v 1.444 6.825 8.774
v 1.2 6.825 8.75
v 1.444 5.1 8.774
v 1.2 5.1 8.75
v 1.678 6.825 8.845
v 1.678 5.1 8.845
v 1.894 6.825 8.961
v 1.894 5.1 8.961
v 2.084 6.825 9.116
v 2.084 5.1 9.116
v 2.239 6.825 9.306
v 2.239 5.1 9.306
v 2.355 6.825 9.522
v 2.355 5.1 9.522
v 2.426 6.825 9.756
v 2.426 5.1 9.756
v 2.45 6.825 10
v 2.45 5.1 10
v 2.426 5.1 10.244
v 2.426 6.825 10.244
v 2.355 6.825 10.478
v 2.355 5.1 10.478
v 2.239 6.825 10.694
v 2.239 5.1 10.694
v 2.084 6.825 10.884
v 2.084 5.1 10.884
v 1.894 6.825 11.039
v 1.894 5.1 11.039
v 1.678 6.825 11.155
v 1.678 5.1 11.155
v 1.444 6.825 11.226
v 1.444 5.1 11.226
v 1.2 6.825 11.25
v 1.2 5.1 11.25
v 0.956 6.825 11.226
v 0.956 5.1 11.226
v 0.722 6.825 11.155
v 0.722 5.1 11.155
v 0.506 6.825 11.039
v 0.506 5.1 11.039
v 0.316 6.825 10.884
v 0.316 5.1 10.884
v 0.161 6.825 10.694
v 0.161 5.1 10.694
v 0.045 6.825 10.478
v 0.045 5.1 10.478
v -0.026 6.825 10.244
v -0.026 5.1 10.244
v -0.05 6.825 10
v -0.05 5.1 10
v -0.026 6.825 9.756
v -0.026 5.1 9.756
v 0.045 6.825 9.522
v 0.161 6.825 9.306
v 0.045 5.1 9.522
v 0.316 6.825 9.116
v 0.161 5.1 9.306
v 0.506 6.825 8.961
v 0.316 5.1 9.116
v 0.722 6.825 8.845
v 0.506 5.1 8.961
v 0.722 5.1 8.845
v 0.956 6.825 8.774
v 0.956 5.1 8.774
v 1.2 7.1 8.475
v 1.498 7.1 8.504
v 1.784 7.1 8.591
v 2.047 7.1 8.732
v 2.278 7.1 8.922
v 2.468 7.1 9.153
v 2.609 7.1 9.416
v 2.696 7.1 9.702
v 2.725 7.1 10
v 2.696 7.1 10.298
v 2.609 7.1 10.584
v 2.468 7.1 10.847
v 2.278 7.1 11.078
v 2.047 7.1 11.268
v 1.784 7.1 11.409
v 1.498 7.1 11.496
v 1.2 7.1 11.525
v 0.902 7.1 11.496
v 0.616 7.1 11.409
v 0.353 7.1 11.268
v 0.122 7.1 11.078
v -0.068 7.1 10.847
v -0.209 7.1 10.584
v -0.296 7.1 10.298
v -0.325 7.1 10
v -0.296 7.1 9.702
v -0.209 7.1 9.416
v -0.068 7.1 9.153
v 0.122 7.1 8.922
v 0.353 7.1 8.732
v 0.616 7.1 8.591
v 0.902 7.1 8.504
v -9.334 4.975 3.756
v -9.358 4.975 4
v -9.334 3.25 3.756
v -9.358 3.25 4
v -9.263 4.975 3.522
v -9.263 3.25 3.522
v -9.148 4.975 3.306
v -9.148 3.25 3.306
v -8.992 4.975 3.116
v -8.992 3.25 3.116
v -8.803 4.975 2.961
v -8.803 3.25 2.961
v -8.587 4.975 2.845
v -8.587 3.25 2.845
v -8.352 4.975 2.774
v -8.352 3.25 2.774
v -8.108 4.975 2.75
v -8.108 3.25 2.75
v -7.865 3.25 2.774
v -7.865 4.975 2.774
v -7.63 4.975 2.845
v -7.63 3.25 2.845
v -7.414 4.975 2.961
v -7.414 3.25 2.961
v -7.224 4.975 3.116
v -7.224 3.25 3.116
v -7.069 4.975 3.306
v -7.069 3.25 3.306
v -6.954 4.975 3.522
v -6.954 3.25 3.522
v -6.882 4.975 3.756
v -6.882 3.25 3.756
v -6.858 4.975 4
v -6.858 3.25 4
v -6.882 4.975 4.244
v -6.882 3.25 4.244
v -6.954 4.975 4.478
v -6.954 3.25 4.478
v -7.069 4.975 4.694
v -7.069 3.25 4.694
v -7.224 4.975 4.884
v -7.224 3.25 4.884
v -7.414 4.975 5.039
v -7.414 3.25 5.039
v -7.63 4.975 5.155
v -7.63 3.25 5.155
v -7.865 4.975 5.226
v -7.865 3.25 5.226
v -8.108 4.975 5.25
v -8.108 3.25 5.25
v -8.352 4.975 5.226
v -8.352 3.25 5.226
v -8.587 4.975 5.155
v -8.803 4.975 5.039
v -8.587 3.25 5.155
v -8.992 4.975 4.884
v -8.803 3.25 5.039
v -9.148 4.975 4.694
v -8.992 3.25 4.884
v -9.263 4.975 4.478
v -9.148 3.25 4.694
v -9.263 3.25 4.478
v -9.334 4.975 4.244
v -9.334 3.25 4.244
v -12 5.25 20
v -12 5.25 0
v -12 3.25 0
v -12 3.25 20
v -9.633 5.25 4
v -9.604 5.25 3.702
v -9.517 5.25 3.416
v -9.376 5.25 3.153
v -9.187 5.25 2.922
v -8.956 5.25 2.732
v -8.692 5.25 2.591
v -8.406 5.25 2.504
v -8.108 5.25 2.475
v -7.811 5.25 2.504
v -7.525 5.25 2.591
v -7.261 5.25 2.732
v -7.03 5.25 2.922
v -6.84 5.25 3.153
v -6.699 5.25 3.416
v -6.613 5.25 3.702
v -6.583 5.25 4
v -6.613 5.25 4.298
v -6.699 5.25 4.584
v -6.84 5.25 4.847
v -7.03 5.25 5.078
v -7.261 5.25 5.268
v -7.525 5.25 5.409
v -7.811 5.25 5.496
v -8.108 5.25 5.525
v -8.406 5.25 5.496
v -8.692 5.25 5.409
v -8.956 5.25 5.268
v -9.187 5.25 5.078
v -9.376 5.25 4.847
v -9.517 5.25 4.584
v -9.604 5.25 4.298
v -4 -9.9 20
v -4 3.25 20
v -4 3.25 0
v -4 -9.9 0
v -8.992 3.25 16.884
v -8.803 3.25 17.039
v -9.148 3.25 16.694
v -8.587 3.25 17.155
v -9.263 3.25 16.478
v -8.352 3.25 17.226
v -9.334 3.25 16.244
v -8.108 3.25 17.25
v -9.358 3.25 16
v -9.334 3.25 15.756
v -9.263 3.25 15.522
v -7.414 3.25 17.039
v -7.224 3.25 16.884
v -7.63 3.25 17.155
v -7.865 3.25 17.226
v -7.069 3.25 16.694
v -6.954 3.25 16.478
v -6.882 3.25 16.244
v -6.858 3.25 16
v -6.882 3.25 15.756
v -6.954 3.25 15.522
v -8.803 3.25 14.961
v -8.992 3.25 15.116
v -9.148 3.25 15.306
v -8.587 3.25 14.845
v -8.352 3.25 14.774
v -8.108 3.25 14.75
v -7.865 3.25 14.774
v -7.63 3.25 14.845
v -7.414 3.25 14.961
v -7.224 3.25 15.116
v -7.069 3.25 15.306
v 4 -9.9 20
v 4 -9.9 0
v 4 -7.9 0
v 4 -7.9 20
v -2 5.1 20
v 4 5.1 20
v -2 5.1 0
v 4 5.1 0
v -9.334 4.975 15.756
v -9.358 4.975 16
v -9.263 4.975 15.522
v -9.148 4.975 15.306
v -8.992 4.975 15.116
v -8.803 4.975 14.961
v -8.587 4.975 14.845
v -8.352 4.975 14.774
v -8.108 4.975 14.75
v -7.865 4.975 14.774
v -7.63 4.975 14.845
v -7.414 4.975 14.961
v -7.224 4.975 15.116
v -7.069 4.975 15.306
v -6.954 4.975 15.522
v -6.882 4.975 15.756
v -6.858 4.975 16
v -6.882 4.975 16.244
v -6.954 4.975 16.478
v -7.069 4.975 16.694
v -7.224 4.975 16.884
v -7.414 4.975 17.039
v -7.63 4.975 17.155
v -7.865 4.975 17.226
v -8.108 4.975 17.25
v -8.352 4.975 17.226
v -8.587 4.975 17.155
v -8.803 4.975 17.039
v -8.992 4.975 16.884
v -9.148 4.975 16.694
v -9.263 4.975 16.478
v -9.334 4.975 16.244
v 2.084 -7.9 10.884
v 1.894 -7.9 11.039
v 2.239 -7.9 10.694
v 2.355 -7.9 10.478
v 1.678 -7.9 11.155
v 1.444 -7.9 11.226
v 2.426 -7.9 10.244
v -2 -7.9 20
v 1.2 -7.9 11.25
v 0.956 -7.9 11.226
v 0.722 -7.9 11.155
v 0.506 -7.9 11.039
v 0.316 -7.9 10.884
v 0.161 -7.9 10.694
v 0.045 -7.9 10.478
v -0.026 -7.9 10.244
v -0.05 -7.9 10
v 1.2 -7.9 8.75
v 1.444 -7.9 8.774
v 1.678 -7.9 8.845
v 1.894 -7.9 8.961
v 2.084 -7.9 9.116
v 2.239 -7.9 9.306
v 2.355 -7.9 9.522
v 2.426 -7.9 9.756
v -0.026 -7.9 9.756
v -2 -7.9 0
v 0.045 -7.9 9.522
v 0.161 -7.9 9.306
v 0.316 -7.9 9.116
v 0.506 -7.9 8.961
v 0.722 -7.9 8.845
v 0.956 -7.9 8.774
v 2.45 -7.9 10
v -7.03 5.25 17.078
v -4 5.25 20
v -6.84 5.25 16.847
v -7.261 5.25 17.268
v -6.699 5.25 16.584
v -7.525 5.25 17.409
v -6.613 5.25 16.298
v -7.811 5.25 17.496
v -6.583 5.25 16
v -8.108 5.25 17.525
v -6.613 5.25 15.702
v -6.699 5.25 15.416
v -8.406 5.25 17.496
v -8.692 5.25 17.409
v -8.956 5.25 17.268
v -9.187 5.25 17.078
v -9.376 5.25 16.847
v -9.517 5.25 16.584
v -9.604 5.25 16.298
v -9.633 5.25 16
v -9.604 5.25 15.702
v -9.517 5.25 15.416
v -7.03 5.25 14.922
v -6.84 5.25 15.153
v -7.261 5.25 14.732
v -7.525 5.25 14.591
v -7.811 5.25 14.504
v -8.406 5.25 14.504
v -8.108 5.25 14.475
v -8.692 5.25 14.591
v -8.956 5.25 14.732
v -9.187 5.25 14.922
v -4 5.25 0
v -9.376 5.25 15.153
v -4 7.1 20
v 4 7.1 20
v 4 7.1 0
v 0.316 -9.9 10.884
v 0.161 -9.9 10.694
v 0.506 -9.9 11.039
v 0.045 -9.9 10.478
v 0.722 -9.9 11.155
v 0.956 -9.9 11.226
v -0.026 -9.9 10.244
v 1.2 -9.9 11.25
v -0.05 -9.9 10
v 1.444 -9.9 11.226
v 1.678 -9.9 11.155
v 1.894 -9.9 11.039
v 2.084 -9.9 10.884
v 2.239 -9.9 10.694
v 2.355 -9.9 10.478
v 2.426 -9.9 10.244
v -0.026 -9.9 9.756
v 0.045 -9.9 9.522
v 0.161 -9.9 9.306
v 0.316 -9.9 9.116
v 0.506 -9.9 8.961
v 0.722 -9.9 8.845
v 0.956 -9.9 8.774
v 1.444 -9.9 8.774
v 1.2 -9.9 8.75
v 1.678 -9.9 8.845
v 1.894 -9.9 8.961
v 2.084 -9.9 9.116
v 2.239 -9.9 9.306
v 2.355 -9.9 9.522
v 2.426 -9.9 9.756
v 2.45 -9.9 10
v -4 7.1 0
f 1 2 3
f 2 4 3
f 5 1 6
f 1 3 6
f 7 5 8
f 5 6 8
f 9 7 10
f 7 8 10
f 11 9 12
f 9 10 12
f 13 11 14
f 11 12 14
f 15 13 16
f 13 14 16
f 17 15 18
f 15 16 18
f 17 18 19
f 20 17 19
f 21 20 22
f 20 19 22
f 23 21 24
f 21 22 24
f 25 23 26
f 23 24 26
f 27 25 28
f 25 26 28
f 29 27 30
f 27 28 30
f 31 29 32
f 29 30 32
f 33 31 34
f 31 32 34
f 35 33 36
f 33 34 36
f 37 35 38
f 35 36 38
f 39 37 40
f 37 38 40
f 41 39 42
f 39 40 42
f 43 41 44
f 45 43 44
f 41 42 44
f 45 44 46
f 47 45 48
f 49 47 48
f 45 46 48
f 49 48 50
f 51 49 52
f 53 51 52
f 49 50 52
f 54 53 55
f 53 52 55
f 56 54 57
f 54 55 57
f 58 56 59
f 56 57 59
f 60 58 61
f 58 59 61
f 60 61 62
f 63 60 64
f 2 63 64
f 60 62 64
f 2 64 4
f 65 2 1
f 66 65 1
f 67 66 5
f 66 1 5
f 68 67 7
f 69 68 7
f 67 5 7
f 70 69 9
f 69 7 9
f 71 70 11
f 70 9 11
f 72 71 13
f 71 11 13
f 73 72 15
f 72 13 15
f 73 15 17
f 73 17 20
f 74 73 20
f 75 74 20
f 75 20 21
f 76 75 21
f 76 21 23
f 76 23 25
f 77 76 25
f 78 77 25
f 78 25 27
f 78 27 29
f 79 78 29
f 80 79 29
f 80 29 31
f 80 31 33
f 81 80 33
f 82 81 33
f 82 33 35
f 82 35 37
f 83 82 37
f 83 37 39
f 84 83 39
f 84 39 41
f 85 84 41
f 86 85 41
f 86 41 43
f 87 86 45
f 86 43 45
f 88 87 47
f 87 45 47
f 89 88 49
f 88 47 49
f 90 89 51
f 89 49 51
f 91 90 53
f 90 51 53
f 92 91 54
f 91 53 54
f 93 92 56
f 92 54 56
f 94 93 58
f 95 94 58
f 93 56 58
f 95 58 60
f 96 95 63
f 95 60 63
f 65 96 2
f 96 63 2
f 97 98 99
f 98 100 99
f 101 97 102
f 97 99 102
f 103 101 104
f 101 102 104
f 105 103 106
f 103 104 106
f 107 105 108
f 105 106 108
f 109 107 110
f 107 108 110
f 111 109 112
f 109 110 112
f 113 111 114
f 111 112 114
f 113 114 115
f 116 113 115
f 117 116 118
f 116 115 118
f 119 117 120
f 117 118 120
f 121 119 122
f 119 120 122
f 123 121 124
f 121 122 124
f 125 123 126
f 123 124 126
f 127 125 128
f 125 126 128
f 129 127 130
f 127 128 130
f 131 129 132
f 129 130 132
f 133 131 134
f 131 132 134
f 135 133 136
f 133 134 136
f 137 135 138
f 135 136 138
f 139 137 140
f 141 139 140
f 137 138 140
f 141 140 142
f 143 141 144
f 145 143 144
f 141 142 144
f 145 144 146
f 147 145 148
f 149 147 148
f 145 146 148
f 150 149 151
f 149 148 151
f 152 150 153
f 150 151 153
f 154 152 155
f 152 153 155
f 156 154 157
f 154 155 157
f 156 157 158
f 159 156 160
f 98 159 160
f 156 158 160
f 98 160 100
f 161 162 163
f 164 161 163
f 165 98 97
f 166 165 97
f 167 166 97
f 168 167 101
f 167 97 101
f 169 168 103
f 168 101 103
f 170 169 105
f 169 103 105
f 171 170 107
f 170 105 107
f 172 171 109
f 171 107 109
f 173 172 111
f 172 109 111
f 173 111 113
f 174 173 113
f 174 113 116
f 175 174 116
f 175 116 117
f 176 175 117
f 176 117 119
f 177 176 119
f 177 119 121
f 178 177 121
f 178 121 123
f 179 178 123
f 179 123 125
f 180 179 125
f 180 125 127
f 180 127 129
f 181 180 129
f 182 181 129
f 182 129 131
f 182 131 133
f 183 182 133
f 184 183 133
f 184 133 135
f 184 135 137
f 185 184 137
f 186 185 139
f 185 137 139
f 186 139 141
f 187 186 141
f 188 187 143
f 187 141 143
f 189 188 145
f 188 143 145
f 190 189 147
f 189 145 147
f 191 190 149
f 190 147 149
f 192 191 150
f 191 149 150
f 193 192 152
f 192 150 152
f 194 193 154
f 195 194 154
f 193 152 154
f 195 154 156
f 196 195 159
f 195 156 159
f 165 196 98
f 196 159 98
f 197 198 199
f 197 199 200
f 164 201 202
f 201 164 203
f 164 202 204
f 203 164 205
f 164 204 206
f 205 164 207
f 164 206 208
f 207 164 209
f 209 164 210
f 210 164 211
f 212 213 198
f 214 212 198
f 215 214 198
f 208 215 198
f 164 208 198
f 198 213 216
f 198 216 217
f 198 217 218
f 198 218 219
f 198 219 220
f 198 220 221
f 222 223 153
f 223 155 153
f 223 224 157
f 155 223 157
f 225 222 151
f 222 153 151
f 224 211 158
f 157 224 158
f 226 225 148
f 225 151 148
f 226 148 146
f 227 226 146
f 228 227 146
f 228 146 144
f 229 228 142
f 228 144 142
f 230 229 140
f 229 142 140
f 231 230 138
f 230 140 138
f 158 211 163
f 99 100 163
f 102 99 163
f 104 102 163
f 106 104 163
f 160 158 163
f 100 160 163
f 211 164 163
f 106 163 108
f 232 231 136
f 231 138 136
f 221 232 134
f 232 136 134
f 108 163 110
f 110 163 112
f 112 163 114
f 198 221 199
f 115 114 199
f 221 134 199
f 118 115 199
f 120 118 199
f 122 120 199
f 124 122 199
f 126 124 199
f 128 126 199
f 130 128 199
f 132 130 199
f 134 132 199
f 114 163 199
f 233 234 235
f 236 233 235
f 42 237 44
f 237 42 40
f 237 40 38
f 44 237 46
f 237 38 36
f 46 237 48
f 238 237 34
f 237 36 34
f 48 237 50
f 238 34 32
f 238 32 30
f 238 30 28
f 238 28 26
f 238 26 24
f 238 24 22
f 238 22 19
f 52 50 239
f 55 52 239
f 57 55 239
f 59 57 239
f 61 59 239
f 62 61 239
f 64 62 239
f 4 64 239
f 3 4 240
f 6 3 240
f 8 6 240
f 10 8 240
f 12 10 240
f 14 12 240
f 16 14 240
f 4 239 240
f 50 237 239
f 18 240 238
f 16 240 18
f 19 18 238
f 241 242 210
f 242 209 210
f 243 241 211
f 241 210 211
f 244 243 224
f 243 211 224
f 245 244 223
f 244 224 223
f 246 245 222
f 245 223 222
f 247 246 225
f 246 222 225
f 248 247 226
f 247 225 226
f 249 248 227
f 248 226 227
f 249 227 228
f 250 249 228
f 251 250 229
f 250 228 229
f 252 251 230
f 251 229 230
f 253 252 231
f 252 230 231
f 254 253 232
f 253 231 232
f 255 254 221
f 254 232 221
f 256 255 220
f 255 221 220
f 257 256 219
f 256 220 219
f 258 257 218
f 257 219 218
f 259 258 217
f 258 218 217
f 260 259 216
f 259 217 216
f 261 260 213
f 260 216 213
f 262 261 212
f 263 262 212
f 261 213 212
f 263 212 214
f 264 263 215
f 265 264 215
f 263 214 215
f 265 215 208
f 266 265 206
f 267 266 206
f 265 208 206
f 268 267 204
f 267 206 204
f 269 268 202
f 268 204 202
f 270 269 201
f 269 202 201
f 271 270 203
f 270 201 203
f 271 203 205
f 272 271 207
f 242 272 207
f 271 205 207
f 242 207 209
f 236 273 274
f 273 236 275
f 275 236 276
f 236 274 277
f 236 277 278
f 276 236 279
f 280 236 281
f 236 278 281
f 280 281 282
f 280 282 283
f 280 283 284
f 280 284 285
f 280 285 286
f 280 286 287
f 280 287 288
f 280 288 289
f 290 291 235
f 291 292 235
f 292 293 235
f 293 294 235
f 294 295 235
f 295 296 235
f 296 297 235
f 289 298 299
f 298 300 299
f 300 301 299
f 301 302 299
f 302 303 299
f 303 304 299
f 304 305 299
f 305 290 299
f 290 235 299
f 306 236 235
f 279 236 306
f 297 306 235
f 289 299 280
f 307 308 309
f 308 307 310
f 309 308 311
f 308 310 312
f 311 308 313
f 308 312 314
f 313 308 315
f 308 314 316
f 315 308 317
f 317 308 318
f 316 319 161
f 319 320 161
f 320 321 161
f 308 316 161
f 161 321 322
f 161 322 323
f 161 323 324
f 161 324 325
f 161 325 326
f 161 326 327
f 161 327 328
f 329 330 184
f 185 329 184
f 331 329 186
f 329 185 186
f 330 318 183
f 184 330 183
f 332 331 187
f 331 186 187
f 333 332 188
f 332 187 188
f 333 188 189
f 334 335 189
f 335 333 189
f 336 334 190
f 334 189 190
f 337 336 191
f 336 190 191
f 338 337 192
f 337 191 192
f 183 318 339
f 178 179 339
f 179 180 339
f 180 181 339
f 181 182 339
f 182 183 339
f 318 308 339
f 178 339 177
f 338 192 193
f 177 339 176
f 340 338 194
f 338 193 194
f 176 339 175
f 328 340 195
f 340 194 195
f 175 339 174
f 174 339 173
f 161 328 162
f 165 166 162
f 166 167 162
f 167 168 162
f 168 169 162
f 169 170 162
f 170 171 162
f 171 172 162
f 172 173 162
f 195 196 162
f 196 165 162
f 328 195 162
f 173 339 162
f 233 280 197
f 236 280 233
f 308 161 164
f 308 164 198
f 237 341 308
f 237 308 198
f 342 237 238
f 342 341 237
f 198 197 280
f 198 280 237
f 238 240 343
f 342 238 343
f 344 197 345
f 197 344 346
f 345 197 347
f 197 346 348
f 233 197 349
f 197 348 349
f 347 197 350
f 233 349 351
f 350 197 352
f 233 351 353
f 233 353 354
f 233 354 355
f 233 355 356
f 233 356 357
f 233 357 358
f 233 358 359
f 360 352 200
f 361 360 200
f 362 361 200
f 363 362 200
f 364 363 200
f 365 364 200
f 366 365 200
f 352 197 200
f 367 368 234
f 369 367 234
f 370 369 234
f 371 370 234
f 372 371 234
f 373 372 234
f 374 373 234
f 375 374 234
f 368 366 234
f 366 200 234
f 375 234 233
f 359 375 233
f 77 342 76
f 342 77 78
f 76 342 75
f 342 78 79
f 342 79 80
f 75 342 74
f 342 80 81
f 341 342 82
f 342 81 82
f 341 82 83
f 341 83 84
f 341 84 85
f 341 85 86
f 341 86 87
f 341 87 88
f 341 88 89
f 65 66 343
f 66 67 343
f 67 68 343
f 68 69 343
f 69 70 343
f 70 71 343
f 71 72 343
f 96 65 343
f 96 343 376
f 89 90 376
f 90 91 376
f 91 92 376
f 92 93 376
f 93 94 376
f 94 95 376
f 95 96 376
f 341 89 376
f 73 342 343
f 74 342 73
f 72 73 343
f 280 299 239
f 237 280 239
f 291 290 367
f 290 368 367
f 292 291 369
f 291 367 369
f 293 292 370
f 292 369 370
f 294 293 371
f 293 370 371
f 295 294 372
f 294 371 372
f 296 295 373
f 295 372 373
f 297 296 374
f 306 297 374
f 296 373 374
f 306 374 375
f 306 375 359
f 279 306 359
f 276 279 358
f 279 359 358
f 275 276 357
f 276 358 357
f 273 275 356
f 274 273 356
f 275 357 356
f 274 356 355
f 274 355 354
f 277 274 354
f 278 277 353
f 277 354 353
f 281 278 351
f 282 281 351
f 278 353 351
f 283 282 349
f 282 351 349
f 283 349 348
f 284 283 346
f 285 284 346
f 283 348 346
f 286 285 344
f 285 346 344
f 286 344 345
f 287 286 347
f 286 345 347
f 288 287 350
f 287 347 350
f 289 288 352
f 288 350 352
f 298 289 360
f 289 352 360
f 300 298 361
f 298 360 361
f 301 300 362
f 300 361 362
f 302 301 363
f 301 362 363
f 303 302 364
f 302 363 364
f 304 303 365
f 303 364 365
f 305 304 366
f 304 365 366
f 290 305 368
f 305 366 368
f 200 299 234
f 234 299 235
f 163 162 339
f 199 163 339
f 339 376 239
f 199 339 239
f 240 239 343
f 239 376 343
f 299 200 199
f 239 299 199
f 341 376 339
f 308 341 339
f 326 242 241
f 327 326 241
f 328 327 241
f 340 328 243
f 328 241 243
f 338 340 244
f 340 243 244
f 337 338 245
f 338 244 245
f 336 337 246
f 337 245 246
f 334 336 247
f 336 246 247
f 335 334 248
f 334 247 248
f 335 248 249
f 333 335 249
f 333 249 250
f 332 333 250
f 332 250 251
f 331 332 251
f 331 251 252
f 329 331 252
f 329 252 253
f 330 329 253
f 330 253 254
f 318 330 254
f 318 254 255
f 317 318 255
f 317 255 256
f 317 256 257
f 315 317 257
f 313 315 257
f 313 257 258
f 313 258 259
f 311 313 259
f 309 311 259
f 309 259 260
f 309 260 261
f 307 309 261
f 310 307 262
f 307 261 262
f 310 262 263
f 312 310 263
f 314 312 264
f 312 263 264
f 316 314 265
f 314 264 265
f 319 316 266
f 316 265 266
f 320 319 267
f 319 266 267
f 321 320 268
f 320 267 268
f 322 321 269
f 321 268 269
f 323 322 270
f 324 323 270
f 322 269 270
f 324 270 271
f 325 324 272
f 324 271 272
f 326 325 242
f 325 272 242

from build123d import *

# Parameters (mm, degrees)
BOSS_EXTRUDE1_DEPTH         = 20
M3_TAPPED_HOLE1_D           = 2.5
M3_TAPPED_HOLE1_CSINK_D     = 3.05
M3_TAPPED_HOLE1_CSINK_ANGLE = 90
M3_TAPPED_HOLE2_D           = 2.5
M3_TAPPED_HOLE2_CSINK_D     = 3.05
M3_TAPPED_HOLE2_CSINK_ANGLE = 90


with BuildPart() as part:
    # Sketch1 → Boss-Extrude1 (new body)
    with BuildSketch(Plane.XY):
        Polygon((2, 5.1), (4, 5.1), (4, 7.1), (-4, 7.1), (-4, 5.25), (-12, 5.25), (-12, 3.25), (-4, 3.25), (-4, -9.9), (4, -9.9), (4, -7.9), (2, -7.9), (-2, -7.9), (-2, 5.1), align=None)
    extrude(amount=BOSS_EXTRUDE1_DEPTH)

    # M3 Tapped Hole1 (through all)
    with Locations(Plane(origin=(-8.108371913, 5.25, 4), x_dir=(1, 0, 0), z_dir=(0, 1, 0))):
        with Locations((0, 0), (0, -12)):
            CounterSinkHole(M3_TAPPED_HOLE1_D / 2, M3_TAPPED_HOLE1_CSINK_D / 2, counter_sink_angle=M3_TAPPED_HOLE1_CSINK_ANGLE)

    # M3 Tapped Hole2 (through all)
    with Locations(Plane(origin=(1.2, 7.1, 10), x_dir=(0, 0, 1), z_dir=(0, 1, 0))):
        with Locations((0, 0)):
            CounterSinkHole(M3_TAPPED_HOLE2_D / 2, M3_TAPPED_HOLE2_CSINK_D / 2, counter_sink_angle=M3_TAPPED_HOLE2_CSINK_ANGLE)


solid = part.part
